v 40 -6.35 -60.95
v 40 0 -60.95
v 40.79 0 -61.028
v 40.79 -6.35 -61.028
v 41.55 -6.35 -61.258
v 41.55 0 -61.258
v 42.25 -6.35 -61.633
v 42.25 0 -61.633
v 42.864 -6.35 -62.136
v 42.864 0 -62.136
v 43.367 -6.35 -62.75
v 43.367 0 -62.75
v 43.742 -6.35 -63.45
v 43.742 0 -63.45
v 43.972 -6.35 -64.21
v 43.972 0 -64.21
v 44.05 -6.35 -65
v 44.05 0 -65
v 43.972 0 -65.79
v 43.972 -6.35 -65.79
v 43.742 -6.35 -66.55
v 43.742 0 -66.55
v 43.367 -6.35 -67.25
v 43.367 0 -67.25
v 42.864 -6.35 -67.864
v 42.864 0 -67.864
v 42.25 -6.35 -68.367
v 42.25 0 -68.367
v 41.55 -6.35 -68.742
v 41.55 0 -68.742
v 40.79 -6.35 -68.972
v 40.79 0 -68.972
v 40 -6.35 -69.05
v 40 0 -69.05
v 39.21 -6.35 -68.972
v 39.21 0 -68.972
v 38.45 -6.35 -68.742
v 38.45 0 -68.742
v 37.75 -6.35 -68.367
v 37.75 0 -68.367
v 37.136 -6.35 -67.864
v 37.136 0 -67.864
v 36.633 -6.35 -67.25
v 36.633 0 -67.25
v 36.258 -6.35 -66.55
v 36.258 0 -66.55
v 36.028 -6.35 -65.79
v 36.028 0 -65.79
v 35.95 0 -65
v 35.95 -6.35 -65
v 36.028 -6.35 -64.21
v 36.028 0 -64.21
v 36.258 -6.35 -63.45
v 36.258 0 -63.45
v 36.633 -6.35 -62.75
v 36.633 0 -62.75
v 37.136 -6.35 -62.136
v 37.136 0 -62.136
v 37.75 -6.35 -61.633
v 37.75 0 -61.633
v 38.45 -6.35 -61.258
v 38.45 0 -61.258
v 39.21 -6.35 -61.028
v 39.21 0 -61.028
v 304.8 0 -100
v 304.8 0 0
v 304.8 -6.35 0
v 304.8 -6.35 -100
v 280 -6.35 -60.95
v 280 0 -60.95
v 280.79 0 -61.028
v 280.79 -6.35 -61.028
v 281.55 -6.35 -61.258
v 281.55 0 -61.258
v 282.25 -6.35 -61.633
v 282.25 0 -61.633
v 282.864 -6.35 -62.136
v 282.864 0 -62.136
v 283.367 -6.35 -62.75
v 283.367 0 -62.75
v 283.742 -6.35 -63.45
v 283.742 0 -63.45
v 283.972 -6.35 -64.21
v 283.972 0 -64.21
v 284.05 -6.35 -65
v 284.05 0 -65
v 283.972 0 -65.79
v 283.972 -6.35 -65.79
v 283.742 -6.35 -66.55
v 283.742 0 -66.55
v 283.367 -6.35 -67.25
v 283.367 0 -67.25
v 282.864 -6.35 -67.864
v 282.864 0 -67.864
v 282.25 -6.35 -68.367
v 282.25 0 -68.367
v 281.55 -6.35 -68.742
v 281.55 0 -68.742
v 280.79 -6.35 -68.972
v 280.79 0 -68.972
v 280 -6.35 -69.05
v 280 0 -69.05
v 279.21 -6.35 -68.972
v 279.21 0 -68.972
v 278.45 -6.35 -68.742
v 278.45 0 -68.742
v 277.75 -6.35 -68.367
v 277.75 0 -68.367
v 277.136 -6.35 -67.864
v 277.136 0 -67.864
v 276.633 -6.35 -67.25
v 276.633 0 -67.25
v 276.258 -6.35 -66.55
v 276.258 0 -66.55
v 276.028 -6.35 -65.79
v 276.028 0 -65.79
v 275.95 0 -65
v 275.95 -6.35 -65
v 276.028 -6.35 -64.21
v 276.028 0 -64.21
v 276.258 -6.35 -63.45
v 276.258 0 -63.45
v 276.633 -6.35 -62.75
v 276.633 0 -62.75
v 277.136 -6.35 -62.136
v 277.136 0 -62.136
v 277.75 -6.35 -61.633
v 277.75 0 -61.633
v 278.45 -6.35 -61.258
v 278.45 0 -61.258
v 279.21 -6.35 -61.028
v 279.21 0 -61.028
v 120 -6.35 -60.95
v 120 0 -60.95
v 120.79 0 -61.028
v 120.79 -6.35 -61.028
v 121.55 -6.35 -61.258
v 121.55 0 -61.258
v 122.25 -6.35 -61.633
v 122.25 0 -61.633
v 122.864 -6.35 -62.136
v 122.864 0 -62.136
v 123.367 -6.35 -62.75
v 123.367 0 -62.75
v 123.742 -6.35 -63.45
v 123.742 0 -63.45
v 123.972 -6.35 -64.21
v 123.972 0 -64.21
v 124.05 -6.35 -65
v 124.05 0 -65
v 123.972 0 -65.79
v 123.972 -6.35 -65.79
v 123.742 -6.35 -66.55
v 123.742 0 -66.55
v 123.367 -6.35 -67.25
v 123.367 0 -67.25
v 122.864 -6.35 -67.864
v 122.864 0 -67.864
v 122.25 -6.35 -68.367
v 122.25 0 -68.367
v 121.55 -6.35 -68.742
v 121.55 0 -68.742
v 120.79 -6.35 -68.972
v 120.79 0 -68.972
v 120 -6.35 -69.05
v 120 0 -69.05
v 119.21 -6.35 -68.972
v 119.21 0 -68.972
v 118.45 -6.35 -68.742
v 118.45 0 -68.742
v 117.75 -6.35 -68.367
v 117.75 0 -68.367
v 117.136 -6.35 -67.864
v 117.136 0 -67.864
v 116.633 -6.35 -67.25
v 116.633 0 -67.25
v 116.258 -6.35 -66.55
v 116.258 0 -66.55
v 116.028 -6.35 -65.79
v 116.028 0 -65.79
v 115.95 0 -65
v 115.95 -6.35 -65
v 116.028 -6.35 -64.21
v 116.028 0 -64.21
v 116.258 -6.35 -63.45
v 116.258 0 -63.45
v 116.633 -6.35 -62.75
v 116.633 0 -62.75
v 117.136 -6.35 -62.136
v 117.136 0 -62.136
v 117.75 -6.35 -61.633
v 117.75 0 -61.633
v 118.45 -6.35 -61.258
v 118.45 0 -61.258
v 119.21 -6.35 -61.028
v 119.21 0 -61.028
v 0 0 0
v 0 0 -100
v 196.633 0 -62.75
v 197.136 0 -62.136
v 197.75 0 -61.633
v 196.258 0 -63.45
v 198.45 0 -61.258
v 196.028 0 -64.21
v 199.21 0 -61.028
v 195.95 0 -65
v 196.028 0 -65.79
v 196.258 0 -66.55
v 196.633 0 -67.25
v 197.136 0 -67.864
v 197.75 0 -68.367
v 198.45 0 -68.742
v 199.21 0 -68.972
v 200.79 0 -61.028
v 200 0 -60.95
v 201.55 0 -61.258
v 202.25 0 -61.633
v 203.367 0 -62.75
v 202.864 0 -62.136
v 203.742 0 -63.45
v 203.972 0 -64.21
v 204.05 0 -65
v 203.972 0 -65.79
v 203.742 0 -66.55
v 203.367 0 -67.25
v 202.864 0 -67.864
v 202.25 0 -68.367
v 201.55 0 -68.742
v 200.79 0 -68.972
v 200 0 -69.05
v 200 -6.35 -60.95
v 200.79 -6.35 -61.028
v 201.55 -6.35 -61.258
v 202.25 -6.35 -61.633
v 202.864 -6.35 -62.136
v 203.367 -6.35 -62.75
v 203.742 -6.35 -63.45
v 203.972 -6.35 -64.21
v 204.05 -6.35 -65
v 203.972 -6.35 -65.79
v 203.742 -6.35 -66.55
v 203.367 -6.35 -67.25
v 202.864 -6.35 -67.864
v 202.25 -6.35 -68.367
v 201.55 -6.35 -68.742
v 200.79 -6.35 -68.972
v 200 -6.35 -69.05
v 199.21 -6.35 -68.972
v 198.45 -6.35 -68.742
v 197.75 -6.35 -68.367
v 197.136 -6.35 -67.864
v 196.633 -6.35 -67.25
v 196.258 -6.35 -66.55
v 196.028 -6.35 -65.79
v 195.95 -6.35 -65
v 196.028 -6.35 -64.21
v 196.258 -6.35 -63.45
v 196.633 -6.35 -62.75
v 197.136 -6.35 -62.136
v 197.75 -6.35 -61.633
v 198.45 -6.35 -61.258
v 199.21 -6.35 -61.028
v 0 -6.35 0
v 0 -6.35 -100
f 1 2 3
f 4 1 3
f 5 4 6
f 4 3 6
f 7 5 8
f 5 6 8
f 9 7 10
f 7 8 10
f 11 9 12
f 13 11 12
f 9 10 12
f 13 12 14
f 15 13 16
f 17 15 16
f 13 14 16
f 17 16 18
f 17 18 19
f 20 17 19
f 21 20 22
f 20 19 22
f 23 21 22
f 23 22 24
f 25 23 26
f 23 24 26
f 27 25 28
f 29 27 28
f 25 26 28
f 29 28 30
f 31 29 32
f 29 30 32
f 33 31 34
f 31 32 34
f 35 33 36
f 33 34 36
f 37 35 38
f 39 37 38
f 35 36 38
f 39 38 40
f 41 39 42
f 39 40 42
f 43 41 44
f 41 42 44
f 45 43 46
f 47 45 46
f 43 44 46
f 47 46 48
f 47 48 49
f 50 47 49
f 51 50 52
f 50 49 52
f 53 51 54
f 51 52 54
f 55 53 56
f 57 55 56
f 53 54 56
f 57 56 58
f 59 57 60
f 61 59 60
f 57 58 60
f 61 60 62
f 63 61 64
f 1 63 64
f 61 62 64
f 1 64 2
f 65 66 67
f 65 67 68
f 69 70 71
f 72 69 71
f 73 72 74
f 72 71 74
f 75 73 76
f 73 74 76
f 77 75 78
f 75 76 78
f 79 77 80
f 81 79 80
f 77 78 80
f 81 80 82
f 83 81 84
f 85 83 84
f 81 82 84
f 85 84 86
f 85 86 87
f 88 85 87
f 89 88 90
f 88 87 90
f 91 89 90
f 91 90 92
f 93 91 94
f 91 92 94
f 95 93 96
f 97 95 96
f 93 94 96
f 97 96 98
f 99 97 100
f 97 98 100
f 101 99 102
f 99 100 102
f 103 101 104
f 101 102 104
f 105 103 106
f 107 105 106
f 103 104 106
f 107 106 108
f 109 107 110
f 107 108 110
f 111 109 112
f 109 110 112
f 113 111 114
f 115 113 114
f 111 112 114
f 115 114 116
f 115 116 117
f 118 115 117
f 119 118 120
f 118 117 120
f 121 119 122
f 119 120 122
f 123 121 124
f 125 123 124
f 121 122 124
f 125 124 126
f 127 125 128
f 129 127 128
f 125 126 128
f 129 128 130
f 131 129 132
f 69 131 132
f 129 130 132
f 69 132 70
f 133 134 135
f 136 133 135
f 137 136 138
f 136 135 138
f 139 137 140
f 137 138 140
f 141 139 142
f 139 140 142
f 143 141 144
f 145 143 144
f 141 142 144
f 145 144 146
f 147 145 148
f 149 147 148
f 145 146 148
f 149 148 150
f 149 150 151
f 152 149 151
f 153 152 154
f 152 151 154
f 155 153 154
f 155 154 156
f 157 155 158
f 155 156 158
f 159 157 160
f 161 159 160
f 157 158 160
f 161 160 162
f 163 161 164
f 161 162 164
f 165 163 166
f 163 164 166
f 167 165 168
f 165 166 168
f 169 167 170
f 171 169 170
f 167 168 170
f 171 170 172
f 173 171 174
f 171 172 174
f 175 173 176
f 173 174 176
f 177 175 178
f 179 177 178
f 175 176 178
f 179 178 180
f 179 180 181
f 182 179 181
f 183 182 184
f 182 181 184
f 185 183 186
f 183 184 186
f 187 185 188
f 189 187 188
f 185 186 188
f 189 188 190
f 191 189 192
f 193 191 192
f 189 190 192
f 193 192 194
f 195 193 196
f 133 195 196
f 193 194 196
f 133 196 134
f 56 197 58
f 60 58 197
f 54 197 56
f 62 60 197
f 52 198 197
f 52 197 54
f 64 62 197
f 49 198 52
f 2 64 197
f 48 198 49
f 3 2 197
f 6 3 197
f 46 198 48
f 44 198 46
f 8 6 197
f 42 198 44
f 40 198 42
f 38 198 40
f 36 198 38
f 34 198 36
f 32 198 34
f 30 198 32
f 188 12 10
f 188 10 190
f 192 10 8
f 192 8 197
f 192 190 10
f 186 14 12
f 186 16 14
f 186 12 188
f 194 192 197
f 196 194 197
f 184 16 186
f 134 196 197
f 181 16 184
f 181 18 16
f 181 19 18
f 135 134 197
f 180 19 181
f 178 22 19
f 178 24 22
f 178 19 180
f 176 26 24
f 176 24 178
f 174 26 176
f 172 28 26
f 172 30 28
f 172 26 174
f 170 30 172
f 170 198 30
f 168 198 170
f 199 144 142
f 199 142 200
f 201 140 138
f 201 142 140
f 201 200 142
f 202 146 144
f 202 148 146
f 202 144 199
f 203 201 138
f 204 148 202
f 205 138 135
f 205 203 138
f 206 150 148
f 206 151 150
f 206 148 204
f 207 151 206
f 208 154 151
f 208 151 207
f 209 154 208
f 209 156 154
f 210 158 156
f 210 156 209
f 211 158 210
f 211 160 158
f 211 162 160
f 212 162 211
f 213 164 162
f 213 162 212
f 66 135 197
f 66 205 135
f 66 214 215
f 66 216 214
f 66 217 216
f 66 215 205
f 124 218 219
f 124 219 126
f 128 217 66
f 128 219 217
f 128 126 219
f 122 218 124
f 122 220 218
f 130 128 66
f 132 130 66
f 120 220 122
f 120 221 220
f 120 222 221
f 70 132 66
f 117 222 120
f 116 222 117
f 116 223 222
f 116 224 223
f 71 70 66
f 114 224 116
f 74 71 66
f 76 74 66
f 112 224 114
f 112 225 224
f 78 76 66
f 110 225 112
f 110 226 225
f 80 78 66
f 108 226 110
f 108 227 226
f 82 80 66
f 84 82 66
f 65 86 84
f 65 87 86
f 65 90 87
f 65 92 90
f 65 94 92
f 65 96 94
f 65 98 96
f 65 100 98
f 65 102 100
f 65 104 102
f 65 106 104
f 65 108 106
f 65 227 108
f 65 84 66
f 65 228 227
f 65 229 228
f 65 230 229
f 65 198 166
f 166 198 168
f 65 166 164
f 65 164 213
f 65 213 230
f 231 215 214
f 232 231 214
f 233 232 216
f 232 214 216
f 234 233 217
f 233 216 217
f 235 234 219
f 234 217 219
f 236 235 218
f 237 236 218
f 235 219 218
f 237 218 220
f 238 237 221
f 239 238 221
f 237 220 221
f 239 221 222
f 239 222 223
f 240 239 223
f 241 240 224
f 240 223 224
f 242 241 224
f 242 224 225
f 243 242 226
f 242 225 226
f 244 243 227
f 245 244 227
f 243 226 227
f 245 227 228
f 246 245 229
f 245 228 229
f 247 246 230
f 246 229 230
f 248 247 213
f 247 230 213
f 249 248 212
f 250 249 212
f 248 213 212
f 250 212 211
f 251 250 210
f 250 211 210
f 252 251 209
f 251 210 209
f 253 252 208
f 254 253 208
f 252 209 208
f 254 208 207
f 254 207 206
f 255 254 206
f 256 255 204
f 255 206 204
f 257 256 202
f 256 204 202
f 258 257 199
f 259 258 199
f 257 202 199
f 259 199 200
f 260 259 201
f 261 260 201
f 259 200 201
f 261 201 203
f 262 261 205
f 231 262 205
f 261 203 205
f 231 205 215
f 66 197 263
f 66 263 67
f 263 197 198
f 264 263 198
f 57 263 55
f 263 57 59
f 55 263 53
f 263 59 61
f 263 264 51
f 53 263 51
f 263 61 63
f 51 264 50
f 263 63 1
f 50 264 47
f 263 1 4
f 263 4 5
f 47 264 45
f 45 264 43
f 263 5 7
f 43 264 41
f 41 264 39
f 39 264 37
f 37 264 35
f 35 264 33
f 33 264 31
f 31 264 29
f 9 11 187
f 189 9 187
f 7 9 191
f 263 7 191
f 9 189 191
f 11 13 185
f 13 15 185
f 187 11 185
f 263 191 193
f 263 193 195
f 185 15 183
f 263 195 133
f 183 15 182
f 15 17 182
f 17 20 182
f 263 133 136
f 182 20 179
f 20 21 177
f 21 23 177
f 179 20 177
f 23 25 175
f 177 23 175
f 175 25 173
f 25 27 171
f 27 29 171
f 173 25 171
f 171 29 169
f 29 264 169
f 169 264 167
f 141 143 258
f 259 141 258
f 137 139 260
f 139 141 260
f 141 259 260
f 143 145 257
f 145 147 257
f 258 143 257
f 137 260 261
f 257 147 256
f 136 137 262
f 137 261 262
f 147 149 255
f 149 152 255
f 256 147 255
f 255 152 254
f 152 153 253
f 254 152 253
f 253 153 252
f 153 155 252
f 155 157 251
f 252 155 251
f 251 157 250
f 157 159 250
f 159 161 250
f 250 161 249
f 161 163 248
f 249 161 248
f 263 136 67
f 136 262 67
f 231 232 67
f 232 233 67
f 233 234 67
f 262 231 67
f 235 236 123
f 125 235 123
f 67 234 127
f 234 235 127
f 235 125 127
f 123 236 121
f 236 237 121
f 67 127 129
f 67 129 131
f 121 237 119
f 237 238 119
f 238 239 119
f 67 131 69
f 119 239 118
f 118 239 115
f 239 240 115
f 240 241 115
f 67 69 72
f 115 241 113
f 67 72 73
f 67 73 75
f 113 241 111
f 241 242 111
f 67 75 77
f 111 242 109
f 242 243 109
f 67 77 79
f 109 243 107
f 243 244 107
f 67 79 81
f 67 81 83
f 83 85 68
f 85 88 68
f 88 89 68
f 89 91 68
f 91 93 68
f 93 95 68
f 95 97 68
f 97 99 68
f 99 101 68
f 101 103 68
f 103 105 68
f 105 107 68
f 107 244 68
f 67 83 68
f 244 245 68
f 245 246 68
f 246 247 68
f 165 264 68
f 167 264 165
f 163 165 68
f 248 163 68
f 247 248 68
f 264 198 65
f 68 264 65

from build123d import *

# Parameters (mm, degrees)
SKETCH1_W           = 304.8
SKETCH1_H           = 100
SKETCH1_R           = 4.05
BOSS_EXTRUDE1_DEPTH = 6.35


with BuildPart() as part:
    # Sketch1 → Boss-Extrude1 (new body)
    with BuildSketch(Plane(origin=(0, 0, 0), x_dir=(1, 0, 0), z_dir=(0, 1, 0))):
        with Locations((152.4, 50)):
            Rectangle(SKETCH1_W, SKETCH1_H)
        with Locations(Location((40, 65, 0), (0, 0, 270))):
            Circle(SKETCH1_R, mode=Mode.SUBTRACT)
        with Locations(Location((120, 65, 0), (0, 0, 270))):
            Circle(SKETCH1_R, mode=Mode.SUBTRACT)
        with Locations(Location((200, 65, 0), (0, 0, 270))):
            Circle(SKETCH1_R, mode=Mode.SUBTRACT)
        with Locations(Location((280, 65, 0), (0, 0, 270))):
            Circle(SKETCH1_R, mode=Mode.SUBTRACT)
    extrude(amount=-BOSS_EXTRUDE1_DEPTH)


solid = part.part
